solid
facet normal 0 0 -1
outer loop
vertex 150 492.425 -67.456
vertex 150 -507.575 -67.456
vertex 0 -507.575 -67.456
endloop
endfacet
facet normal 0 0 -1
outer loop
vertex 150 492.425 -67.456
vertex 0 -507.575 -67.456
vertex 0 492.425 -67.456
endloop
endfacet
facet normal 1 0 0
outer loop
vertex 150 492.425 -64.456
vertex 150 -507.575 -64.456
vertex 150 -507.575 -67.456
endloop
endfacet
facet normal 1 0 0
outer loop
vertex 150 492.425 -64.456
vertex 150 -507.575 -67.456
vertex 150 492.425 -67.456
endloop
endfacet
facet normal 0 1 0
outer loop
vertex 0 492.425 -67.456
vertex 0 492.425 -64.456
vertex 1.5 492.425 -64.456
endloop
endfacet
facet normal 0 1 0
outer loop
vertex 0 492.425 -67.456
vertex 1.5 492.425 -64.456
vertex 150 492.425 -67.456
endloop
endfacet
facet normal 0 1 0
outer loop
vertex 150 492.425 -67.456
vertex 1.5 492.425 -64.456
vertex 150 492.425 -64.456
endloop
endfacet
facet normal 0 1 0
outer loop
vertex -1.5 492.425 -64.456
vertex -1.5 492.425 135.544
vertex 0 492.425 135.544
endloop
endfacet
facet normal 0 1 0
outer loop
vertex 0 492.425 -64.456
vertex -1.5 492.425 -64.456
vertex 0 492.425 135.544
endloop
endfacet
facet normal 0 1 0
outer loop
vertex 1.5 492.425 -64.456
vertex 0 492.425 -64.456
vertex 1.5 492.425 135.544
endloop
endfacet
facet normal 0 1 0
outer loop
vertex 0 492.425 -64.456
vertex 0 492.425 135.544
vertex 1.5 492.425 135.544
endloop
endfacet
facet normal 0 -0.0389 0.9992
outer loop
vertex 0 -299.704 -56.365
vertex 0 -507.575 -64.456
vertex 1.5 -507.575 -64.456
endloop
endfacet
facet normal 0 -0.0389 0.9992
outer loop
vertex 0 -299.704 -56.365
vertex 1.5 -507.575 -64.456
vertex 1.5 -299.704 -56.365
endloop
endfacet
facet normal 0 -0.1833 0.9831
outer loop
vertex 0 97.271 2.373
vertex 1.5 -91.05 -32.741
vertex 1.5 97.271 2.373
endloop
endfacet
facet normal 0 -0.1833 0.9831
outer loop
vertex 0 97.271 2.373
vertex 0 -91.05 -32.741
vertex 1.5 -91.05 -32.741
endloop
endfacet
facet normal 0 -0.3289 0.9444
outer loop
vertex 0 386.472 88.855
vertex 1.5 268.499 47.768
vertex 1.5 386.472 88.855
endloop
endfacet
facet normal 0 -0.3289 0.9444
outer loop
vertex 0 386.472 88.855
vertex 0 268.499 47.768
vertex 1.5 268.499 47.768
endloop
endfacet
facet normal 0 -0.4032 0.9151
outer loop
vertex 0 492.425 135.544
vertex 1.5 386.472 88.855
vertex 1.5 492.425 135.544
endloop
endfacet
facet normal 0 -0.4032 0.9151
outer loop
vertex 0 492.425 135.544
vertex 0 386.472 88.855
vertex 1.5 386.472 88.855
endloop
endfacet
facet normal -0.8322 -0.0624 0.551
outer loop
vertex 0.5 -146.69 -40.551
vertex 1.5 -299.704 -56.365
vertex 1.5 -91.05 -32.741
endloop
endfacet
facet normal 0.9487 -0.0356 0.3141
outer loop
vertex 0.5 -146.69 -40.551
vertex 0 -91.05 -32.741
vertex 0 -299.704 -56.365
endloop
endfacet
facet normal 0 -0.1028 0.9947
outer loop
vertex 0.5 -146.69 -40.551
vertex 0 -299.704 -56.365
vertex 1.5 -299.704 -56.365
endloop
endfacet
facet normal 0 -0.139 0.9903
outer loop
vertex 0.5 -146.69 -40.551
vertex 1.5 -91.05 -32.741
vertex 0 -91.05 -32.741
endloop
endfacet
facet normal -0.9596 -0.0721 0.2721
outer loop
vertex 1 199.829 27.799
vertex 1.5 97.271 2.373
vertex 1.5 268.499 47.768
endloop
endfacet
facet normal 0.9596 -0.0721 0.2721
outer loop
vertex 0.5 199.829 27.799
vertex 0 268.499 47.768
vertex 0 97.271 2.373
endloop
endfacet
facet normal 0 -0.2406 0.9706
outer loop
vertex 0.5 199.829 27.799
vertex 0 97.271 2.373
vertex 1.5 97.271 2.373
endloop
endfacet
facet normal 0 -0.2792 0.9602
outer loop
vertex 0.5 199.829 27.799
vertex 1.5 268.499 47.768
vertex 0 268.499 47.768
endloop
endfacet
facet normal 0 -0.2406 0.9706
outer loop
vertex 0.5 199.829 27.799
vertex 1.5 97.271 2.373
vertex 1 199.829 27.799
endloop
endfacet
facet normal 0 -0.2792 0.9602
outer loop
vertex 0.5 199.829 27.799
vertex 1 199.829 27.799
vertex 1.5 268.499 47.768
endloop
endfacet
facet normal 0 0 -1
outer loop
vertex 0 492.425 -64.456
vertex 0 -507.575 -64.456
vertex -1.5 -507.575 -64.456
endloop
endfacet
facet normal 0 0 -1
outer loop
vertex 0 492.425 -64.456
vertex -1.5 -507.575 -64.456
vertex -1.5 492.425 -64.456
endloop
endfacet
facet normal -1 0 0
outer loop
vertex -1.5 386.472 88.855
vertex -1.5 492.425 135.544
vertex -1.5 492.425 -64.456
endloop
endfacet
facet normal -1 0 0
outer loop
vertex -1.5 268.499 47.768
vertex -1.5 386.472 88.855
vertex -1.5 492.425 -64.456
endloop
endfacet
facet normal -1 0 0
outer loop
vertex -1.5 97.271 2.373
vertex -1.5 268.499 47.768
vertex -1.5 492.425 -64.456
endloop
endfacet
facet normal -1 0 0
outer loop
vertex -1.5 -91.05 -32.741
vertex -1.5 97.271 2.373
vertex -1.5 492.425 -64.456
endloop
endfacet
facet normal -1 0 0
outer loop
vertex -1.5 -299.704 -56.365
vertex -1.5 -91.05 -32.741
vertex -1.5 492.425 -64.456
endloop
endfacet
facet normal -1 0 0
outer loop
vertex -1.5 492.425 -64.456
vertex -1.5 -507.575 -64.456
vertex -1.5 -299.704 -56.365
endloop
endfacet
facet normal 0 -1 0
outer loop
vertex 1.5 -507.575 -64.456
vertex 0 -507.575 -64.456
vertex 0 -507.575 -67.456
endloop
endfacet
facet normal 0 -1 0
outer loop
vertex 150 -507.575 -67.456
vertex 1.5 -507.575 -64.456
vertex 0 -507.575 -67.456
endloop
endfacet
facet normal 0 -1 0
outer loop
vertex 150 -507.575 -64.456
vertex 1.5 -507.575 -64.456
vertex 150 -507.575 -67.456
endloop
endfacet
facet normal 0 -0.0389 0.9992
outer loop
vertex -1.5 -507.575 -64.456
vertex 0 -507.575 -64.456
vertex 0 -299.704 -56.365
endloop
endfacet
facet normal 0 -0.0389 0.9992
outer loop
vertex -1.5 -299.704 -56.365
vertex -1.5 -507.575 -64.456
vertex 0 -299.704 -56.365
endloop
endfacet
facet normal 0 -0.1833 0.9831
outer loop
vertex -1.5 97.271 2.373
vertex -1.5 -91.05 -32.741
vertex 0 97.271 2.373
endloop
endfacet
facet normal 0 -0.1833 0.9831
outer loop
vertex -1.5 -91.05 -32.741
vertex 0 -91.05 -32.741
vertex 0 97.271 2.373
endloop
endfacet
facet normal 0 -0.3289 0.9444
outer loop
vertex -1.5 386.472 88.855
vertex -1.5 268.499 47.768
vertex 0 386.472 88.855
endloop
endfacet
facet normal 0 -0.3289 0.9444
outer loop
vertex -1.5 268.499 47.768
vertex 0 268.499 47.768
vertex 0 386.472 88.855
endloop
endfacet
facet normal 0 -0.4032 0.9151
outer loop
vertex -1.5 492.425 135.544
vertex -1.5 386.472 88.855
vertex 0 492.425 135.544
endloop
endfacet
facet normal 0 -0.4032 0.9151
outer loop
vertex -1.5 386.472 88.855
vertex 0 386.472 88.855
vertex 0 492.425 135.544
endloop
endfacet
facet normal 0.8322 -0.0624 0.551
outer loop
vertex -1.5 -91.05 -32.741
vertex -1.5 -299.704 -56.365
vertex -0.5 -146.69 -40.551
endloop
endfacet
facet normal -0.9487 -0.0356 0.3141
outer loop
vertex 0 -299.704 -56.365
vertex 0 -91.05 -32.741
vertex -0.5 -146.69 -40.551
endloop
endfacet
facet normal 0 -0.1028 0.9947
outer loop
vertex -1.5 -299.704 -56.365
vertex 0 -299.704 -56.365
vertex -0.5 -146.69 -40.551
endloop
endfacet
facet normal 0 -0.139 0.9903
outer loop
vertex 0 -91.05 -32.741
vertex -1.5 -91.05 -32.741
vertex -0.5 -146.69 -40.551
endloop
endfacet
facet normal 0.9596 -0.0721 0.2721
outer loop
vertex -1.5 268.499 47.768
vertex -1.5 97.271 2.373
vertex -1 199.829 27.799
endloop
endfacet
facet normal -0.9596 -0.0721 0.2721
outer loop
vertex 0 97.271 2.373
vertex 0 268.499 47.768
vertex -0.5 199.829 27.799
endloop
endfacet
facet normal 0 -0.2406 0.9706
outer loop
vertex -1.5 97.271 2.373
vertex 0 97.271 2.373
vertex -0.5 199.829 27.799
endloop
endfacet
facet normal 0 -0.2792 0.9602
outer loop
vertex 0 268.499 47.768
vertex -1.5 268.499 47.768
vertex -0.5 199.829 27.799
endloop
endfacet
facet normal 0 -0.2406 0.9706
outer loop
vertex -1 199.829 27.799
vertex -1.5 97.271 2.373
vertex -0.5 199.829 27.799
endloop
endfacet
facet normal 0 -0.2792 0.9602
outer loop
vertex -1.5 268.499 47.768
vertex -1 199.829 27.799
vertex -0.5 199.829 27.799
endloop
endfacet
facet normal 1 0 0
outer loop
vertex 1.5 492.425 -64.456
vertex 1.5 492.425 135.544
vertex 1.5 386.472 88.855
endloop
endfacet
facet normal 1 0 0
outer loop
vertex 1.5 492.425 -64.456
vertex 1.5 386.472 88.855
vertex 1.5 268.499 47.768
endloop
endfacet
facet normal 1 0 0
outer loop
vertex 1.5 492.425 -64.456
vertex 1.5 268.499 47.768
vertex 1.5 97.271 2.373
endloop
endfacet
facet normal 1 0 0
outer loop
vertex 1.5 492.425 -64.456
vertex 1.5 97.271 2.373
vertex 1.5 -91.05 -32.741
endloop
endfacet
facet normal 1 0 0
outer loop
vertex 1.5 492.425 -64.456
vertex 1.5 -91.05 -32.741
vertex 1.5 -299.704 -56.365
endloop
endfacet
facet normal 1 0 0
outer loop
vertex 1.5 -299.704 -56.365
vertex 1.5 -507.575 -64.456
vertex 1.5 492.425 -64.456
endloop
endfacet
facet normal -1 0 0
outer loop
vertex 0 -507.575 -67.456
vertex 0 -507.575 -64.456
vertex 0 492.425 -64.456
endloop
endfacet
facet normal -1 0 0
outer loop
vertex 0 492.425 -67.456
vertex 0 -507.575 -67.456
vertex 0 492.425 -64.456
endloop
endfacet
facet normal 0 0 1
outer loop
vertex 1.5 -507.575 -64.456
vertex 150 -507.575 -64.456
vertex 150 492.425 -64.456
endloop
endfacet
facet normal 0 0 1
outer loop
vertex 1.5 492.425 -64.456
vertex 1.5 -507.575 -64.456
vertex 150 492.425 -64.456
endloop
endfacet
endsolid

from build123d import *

# Parameters (mm, degrees)
F1_DEPTH = 1.5
F2_E1_W  = 1000
F2_E1_H  = 150
F3_DEPTH = 3


with BuildPart() as f1:
    # F0 (on Right) → F1 (new body, symmetric)
    with BuildSketch(Plane.YZ):
        with BuildLine():
            add(Edge.make_bspline(
                [(-507.5750658325, -64.4556317002), (-152.691480371, -64.4556317002), (239.9747440193, 9.7828772396), (492.4249341675, 135.5443682998)],
                knots=[0, 0, 0, 0, 1019.8039027186, 1019.8039027186, 1019.8039027186, 1019.8039027186], degree=3))
            Line((-507.5750658325, -64.4556317002), (492.4249341675, -64.4556317002))
            Line((492.4249341675, -64.4556317002), (492.4249341675, 135.5443682998))
        make_face()
    extrude(amount=F1_DEPTH, both=True)

    # F2_E1 (on explicit) → F3 (join)
    with BuildSketch(Plane(origin=(0, -507.5750658325, -64.4556317002), x_dir=(0, 1, 0), z_dir=(0, 0, -1))):
        with Locations((500, 75)):
            Rectangle(F2_E1_W, F2_E1_H)
    extrude(amount=F3_DEPTH)


solid = f1.part
